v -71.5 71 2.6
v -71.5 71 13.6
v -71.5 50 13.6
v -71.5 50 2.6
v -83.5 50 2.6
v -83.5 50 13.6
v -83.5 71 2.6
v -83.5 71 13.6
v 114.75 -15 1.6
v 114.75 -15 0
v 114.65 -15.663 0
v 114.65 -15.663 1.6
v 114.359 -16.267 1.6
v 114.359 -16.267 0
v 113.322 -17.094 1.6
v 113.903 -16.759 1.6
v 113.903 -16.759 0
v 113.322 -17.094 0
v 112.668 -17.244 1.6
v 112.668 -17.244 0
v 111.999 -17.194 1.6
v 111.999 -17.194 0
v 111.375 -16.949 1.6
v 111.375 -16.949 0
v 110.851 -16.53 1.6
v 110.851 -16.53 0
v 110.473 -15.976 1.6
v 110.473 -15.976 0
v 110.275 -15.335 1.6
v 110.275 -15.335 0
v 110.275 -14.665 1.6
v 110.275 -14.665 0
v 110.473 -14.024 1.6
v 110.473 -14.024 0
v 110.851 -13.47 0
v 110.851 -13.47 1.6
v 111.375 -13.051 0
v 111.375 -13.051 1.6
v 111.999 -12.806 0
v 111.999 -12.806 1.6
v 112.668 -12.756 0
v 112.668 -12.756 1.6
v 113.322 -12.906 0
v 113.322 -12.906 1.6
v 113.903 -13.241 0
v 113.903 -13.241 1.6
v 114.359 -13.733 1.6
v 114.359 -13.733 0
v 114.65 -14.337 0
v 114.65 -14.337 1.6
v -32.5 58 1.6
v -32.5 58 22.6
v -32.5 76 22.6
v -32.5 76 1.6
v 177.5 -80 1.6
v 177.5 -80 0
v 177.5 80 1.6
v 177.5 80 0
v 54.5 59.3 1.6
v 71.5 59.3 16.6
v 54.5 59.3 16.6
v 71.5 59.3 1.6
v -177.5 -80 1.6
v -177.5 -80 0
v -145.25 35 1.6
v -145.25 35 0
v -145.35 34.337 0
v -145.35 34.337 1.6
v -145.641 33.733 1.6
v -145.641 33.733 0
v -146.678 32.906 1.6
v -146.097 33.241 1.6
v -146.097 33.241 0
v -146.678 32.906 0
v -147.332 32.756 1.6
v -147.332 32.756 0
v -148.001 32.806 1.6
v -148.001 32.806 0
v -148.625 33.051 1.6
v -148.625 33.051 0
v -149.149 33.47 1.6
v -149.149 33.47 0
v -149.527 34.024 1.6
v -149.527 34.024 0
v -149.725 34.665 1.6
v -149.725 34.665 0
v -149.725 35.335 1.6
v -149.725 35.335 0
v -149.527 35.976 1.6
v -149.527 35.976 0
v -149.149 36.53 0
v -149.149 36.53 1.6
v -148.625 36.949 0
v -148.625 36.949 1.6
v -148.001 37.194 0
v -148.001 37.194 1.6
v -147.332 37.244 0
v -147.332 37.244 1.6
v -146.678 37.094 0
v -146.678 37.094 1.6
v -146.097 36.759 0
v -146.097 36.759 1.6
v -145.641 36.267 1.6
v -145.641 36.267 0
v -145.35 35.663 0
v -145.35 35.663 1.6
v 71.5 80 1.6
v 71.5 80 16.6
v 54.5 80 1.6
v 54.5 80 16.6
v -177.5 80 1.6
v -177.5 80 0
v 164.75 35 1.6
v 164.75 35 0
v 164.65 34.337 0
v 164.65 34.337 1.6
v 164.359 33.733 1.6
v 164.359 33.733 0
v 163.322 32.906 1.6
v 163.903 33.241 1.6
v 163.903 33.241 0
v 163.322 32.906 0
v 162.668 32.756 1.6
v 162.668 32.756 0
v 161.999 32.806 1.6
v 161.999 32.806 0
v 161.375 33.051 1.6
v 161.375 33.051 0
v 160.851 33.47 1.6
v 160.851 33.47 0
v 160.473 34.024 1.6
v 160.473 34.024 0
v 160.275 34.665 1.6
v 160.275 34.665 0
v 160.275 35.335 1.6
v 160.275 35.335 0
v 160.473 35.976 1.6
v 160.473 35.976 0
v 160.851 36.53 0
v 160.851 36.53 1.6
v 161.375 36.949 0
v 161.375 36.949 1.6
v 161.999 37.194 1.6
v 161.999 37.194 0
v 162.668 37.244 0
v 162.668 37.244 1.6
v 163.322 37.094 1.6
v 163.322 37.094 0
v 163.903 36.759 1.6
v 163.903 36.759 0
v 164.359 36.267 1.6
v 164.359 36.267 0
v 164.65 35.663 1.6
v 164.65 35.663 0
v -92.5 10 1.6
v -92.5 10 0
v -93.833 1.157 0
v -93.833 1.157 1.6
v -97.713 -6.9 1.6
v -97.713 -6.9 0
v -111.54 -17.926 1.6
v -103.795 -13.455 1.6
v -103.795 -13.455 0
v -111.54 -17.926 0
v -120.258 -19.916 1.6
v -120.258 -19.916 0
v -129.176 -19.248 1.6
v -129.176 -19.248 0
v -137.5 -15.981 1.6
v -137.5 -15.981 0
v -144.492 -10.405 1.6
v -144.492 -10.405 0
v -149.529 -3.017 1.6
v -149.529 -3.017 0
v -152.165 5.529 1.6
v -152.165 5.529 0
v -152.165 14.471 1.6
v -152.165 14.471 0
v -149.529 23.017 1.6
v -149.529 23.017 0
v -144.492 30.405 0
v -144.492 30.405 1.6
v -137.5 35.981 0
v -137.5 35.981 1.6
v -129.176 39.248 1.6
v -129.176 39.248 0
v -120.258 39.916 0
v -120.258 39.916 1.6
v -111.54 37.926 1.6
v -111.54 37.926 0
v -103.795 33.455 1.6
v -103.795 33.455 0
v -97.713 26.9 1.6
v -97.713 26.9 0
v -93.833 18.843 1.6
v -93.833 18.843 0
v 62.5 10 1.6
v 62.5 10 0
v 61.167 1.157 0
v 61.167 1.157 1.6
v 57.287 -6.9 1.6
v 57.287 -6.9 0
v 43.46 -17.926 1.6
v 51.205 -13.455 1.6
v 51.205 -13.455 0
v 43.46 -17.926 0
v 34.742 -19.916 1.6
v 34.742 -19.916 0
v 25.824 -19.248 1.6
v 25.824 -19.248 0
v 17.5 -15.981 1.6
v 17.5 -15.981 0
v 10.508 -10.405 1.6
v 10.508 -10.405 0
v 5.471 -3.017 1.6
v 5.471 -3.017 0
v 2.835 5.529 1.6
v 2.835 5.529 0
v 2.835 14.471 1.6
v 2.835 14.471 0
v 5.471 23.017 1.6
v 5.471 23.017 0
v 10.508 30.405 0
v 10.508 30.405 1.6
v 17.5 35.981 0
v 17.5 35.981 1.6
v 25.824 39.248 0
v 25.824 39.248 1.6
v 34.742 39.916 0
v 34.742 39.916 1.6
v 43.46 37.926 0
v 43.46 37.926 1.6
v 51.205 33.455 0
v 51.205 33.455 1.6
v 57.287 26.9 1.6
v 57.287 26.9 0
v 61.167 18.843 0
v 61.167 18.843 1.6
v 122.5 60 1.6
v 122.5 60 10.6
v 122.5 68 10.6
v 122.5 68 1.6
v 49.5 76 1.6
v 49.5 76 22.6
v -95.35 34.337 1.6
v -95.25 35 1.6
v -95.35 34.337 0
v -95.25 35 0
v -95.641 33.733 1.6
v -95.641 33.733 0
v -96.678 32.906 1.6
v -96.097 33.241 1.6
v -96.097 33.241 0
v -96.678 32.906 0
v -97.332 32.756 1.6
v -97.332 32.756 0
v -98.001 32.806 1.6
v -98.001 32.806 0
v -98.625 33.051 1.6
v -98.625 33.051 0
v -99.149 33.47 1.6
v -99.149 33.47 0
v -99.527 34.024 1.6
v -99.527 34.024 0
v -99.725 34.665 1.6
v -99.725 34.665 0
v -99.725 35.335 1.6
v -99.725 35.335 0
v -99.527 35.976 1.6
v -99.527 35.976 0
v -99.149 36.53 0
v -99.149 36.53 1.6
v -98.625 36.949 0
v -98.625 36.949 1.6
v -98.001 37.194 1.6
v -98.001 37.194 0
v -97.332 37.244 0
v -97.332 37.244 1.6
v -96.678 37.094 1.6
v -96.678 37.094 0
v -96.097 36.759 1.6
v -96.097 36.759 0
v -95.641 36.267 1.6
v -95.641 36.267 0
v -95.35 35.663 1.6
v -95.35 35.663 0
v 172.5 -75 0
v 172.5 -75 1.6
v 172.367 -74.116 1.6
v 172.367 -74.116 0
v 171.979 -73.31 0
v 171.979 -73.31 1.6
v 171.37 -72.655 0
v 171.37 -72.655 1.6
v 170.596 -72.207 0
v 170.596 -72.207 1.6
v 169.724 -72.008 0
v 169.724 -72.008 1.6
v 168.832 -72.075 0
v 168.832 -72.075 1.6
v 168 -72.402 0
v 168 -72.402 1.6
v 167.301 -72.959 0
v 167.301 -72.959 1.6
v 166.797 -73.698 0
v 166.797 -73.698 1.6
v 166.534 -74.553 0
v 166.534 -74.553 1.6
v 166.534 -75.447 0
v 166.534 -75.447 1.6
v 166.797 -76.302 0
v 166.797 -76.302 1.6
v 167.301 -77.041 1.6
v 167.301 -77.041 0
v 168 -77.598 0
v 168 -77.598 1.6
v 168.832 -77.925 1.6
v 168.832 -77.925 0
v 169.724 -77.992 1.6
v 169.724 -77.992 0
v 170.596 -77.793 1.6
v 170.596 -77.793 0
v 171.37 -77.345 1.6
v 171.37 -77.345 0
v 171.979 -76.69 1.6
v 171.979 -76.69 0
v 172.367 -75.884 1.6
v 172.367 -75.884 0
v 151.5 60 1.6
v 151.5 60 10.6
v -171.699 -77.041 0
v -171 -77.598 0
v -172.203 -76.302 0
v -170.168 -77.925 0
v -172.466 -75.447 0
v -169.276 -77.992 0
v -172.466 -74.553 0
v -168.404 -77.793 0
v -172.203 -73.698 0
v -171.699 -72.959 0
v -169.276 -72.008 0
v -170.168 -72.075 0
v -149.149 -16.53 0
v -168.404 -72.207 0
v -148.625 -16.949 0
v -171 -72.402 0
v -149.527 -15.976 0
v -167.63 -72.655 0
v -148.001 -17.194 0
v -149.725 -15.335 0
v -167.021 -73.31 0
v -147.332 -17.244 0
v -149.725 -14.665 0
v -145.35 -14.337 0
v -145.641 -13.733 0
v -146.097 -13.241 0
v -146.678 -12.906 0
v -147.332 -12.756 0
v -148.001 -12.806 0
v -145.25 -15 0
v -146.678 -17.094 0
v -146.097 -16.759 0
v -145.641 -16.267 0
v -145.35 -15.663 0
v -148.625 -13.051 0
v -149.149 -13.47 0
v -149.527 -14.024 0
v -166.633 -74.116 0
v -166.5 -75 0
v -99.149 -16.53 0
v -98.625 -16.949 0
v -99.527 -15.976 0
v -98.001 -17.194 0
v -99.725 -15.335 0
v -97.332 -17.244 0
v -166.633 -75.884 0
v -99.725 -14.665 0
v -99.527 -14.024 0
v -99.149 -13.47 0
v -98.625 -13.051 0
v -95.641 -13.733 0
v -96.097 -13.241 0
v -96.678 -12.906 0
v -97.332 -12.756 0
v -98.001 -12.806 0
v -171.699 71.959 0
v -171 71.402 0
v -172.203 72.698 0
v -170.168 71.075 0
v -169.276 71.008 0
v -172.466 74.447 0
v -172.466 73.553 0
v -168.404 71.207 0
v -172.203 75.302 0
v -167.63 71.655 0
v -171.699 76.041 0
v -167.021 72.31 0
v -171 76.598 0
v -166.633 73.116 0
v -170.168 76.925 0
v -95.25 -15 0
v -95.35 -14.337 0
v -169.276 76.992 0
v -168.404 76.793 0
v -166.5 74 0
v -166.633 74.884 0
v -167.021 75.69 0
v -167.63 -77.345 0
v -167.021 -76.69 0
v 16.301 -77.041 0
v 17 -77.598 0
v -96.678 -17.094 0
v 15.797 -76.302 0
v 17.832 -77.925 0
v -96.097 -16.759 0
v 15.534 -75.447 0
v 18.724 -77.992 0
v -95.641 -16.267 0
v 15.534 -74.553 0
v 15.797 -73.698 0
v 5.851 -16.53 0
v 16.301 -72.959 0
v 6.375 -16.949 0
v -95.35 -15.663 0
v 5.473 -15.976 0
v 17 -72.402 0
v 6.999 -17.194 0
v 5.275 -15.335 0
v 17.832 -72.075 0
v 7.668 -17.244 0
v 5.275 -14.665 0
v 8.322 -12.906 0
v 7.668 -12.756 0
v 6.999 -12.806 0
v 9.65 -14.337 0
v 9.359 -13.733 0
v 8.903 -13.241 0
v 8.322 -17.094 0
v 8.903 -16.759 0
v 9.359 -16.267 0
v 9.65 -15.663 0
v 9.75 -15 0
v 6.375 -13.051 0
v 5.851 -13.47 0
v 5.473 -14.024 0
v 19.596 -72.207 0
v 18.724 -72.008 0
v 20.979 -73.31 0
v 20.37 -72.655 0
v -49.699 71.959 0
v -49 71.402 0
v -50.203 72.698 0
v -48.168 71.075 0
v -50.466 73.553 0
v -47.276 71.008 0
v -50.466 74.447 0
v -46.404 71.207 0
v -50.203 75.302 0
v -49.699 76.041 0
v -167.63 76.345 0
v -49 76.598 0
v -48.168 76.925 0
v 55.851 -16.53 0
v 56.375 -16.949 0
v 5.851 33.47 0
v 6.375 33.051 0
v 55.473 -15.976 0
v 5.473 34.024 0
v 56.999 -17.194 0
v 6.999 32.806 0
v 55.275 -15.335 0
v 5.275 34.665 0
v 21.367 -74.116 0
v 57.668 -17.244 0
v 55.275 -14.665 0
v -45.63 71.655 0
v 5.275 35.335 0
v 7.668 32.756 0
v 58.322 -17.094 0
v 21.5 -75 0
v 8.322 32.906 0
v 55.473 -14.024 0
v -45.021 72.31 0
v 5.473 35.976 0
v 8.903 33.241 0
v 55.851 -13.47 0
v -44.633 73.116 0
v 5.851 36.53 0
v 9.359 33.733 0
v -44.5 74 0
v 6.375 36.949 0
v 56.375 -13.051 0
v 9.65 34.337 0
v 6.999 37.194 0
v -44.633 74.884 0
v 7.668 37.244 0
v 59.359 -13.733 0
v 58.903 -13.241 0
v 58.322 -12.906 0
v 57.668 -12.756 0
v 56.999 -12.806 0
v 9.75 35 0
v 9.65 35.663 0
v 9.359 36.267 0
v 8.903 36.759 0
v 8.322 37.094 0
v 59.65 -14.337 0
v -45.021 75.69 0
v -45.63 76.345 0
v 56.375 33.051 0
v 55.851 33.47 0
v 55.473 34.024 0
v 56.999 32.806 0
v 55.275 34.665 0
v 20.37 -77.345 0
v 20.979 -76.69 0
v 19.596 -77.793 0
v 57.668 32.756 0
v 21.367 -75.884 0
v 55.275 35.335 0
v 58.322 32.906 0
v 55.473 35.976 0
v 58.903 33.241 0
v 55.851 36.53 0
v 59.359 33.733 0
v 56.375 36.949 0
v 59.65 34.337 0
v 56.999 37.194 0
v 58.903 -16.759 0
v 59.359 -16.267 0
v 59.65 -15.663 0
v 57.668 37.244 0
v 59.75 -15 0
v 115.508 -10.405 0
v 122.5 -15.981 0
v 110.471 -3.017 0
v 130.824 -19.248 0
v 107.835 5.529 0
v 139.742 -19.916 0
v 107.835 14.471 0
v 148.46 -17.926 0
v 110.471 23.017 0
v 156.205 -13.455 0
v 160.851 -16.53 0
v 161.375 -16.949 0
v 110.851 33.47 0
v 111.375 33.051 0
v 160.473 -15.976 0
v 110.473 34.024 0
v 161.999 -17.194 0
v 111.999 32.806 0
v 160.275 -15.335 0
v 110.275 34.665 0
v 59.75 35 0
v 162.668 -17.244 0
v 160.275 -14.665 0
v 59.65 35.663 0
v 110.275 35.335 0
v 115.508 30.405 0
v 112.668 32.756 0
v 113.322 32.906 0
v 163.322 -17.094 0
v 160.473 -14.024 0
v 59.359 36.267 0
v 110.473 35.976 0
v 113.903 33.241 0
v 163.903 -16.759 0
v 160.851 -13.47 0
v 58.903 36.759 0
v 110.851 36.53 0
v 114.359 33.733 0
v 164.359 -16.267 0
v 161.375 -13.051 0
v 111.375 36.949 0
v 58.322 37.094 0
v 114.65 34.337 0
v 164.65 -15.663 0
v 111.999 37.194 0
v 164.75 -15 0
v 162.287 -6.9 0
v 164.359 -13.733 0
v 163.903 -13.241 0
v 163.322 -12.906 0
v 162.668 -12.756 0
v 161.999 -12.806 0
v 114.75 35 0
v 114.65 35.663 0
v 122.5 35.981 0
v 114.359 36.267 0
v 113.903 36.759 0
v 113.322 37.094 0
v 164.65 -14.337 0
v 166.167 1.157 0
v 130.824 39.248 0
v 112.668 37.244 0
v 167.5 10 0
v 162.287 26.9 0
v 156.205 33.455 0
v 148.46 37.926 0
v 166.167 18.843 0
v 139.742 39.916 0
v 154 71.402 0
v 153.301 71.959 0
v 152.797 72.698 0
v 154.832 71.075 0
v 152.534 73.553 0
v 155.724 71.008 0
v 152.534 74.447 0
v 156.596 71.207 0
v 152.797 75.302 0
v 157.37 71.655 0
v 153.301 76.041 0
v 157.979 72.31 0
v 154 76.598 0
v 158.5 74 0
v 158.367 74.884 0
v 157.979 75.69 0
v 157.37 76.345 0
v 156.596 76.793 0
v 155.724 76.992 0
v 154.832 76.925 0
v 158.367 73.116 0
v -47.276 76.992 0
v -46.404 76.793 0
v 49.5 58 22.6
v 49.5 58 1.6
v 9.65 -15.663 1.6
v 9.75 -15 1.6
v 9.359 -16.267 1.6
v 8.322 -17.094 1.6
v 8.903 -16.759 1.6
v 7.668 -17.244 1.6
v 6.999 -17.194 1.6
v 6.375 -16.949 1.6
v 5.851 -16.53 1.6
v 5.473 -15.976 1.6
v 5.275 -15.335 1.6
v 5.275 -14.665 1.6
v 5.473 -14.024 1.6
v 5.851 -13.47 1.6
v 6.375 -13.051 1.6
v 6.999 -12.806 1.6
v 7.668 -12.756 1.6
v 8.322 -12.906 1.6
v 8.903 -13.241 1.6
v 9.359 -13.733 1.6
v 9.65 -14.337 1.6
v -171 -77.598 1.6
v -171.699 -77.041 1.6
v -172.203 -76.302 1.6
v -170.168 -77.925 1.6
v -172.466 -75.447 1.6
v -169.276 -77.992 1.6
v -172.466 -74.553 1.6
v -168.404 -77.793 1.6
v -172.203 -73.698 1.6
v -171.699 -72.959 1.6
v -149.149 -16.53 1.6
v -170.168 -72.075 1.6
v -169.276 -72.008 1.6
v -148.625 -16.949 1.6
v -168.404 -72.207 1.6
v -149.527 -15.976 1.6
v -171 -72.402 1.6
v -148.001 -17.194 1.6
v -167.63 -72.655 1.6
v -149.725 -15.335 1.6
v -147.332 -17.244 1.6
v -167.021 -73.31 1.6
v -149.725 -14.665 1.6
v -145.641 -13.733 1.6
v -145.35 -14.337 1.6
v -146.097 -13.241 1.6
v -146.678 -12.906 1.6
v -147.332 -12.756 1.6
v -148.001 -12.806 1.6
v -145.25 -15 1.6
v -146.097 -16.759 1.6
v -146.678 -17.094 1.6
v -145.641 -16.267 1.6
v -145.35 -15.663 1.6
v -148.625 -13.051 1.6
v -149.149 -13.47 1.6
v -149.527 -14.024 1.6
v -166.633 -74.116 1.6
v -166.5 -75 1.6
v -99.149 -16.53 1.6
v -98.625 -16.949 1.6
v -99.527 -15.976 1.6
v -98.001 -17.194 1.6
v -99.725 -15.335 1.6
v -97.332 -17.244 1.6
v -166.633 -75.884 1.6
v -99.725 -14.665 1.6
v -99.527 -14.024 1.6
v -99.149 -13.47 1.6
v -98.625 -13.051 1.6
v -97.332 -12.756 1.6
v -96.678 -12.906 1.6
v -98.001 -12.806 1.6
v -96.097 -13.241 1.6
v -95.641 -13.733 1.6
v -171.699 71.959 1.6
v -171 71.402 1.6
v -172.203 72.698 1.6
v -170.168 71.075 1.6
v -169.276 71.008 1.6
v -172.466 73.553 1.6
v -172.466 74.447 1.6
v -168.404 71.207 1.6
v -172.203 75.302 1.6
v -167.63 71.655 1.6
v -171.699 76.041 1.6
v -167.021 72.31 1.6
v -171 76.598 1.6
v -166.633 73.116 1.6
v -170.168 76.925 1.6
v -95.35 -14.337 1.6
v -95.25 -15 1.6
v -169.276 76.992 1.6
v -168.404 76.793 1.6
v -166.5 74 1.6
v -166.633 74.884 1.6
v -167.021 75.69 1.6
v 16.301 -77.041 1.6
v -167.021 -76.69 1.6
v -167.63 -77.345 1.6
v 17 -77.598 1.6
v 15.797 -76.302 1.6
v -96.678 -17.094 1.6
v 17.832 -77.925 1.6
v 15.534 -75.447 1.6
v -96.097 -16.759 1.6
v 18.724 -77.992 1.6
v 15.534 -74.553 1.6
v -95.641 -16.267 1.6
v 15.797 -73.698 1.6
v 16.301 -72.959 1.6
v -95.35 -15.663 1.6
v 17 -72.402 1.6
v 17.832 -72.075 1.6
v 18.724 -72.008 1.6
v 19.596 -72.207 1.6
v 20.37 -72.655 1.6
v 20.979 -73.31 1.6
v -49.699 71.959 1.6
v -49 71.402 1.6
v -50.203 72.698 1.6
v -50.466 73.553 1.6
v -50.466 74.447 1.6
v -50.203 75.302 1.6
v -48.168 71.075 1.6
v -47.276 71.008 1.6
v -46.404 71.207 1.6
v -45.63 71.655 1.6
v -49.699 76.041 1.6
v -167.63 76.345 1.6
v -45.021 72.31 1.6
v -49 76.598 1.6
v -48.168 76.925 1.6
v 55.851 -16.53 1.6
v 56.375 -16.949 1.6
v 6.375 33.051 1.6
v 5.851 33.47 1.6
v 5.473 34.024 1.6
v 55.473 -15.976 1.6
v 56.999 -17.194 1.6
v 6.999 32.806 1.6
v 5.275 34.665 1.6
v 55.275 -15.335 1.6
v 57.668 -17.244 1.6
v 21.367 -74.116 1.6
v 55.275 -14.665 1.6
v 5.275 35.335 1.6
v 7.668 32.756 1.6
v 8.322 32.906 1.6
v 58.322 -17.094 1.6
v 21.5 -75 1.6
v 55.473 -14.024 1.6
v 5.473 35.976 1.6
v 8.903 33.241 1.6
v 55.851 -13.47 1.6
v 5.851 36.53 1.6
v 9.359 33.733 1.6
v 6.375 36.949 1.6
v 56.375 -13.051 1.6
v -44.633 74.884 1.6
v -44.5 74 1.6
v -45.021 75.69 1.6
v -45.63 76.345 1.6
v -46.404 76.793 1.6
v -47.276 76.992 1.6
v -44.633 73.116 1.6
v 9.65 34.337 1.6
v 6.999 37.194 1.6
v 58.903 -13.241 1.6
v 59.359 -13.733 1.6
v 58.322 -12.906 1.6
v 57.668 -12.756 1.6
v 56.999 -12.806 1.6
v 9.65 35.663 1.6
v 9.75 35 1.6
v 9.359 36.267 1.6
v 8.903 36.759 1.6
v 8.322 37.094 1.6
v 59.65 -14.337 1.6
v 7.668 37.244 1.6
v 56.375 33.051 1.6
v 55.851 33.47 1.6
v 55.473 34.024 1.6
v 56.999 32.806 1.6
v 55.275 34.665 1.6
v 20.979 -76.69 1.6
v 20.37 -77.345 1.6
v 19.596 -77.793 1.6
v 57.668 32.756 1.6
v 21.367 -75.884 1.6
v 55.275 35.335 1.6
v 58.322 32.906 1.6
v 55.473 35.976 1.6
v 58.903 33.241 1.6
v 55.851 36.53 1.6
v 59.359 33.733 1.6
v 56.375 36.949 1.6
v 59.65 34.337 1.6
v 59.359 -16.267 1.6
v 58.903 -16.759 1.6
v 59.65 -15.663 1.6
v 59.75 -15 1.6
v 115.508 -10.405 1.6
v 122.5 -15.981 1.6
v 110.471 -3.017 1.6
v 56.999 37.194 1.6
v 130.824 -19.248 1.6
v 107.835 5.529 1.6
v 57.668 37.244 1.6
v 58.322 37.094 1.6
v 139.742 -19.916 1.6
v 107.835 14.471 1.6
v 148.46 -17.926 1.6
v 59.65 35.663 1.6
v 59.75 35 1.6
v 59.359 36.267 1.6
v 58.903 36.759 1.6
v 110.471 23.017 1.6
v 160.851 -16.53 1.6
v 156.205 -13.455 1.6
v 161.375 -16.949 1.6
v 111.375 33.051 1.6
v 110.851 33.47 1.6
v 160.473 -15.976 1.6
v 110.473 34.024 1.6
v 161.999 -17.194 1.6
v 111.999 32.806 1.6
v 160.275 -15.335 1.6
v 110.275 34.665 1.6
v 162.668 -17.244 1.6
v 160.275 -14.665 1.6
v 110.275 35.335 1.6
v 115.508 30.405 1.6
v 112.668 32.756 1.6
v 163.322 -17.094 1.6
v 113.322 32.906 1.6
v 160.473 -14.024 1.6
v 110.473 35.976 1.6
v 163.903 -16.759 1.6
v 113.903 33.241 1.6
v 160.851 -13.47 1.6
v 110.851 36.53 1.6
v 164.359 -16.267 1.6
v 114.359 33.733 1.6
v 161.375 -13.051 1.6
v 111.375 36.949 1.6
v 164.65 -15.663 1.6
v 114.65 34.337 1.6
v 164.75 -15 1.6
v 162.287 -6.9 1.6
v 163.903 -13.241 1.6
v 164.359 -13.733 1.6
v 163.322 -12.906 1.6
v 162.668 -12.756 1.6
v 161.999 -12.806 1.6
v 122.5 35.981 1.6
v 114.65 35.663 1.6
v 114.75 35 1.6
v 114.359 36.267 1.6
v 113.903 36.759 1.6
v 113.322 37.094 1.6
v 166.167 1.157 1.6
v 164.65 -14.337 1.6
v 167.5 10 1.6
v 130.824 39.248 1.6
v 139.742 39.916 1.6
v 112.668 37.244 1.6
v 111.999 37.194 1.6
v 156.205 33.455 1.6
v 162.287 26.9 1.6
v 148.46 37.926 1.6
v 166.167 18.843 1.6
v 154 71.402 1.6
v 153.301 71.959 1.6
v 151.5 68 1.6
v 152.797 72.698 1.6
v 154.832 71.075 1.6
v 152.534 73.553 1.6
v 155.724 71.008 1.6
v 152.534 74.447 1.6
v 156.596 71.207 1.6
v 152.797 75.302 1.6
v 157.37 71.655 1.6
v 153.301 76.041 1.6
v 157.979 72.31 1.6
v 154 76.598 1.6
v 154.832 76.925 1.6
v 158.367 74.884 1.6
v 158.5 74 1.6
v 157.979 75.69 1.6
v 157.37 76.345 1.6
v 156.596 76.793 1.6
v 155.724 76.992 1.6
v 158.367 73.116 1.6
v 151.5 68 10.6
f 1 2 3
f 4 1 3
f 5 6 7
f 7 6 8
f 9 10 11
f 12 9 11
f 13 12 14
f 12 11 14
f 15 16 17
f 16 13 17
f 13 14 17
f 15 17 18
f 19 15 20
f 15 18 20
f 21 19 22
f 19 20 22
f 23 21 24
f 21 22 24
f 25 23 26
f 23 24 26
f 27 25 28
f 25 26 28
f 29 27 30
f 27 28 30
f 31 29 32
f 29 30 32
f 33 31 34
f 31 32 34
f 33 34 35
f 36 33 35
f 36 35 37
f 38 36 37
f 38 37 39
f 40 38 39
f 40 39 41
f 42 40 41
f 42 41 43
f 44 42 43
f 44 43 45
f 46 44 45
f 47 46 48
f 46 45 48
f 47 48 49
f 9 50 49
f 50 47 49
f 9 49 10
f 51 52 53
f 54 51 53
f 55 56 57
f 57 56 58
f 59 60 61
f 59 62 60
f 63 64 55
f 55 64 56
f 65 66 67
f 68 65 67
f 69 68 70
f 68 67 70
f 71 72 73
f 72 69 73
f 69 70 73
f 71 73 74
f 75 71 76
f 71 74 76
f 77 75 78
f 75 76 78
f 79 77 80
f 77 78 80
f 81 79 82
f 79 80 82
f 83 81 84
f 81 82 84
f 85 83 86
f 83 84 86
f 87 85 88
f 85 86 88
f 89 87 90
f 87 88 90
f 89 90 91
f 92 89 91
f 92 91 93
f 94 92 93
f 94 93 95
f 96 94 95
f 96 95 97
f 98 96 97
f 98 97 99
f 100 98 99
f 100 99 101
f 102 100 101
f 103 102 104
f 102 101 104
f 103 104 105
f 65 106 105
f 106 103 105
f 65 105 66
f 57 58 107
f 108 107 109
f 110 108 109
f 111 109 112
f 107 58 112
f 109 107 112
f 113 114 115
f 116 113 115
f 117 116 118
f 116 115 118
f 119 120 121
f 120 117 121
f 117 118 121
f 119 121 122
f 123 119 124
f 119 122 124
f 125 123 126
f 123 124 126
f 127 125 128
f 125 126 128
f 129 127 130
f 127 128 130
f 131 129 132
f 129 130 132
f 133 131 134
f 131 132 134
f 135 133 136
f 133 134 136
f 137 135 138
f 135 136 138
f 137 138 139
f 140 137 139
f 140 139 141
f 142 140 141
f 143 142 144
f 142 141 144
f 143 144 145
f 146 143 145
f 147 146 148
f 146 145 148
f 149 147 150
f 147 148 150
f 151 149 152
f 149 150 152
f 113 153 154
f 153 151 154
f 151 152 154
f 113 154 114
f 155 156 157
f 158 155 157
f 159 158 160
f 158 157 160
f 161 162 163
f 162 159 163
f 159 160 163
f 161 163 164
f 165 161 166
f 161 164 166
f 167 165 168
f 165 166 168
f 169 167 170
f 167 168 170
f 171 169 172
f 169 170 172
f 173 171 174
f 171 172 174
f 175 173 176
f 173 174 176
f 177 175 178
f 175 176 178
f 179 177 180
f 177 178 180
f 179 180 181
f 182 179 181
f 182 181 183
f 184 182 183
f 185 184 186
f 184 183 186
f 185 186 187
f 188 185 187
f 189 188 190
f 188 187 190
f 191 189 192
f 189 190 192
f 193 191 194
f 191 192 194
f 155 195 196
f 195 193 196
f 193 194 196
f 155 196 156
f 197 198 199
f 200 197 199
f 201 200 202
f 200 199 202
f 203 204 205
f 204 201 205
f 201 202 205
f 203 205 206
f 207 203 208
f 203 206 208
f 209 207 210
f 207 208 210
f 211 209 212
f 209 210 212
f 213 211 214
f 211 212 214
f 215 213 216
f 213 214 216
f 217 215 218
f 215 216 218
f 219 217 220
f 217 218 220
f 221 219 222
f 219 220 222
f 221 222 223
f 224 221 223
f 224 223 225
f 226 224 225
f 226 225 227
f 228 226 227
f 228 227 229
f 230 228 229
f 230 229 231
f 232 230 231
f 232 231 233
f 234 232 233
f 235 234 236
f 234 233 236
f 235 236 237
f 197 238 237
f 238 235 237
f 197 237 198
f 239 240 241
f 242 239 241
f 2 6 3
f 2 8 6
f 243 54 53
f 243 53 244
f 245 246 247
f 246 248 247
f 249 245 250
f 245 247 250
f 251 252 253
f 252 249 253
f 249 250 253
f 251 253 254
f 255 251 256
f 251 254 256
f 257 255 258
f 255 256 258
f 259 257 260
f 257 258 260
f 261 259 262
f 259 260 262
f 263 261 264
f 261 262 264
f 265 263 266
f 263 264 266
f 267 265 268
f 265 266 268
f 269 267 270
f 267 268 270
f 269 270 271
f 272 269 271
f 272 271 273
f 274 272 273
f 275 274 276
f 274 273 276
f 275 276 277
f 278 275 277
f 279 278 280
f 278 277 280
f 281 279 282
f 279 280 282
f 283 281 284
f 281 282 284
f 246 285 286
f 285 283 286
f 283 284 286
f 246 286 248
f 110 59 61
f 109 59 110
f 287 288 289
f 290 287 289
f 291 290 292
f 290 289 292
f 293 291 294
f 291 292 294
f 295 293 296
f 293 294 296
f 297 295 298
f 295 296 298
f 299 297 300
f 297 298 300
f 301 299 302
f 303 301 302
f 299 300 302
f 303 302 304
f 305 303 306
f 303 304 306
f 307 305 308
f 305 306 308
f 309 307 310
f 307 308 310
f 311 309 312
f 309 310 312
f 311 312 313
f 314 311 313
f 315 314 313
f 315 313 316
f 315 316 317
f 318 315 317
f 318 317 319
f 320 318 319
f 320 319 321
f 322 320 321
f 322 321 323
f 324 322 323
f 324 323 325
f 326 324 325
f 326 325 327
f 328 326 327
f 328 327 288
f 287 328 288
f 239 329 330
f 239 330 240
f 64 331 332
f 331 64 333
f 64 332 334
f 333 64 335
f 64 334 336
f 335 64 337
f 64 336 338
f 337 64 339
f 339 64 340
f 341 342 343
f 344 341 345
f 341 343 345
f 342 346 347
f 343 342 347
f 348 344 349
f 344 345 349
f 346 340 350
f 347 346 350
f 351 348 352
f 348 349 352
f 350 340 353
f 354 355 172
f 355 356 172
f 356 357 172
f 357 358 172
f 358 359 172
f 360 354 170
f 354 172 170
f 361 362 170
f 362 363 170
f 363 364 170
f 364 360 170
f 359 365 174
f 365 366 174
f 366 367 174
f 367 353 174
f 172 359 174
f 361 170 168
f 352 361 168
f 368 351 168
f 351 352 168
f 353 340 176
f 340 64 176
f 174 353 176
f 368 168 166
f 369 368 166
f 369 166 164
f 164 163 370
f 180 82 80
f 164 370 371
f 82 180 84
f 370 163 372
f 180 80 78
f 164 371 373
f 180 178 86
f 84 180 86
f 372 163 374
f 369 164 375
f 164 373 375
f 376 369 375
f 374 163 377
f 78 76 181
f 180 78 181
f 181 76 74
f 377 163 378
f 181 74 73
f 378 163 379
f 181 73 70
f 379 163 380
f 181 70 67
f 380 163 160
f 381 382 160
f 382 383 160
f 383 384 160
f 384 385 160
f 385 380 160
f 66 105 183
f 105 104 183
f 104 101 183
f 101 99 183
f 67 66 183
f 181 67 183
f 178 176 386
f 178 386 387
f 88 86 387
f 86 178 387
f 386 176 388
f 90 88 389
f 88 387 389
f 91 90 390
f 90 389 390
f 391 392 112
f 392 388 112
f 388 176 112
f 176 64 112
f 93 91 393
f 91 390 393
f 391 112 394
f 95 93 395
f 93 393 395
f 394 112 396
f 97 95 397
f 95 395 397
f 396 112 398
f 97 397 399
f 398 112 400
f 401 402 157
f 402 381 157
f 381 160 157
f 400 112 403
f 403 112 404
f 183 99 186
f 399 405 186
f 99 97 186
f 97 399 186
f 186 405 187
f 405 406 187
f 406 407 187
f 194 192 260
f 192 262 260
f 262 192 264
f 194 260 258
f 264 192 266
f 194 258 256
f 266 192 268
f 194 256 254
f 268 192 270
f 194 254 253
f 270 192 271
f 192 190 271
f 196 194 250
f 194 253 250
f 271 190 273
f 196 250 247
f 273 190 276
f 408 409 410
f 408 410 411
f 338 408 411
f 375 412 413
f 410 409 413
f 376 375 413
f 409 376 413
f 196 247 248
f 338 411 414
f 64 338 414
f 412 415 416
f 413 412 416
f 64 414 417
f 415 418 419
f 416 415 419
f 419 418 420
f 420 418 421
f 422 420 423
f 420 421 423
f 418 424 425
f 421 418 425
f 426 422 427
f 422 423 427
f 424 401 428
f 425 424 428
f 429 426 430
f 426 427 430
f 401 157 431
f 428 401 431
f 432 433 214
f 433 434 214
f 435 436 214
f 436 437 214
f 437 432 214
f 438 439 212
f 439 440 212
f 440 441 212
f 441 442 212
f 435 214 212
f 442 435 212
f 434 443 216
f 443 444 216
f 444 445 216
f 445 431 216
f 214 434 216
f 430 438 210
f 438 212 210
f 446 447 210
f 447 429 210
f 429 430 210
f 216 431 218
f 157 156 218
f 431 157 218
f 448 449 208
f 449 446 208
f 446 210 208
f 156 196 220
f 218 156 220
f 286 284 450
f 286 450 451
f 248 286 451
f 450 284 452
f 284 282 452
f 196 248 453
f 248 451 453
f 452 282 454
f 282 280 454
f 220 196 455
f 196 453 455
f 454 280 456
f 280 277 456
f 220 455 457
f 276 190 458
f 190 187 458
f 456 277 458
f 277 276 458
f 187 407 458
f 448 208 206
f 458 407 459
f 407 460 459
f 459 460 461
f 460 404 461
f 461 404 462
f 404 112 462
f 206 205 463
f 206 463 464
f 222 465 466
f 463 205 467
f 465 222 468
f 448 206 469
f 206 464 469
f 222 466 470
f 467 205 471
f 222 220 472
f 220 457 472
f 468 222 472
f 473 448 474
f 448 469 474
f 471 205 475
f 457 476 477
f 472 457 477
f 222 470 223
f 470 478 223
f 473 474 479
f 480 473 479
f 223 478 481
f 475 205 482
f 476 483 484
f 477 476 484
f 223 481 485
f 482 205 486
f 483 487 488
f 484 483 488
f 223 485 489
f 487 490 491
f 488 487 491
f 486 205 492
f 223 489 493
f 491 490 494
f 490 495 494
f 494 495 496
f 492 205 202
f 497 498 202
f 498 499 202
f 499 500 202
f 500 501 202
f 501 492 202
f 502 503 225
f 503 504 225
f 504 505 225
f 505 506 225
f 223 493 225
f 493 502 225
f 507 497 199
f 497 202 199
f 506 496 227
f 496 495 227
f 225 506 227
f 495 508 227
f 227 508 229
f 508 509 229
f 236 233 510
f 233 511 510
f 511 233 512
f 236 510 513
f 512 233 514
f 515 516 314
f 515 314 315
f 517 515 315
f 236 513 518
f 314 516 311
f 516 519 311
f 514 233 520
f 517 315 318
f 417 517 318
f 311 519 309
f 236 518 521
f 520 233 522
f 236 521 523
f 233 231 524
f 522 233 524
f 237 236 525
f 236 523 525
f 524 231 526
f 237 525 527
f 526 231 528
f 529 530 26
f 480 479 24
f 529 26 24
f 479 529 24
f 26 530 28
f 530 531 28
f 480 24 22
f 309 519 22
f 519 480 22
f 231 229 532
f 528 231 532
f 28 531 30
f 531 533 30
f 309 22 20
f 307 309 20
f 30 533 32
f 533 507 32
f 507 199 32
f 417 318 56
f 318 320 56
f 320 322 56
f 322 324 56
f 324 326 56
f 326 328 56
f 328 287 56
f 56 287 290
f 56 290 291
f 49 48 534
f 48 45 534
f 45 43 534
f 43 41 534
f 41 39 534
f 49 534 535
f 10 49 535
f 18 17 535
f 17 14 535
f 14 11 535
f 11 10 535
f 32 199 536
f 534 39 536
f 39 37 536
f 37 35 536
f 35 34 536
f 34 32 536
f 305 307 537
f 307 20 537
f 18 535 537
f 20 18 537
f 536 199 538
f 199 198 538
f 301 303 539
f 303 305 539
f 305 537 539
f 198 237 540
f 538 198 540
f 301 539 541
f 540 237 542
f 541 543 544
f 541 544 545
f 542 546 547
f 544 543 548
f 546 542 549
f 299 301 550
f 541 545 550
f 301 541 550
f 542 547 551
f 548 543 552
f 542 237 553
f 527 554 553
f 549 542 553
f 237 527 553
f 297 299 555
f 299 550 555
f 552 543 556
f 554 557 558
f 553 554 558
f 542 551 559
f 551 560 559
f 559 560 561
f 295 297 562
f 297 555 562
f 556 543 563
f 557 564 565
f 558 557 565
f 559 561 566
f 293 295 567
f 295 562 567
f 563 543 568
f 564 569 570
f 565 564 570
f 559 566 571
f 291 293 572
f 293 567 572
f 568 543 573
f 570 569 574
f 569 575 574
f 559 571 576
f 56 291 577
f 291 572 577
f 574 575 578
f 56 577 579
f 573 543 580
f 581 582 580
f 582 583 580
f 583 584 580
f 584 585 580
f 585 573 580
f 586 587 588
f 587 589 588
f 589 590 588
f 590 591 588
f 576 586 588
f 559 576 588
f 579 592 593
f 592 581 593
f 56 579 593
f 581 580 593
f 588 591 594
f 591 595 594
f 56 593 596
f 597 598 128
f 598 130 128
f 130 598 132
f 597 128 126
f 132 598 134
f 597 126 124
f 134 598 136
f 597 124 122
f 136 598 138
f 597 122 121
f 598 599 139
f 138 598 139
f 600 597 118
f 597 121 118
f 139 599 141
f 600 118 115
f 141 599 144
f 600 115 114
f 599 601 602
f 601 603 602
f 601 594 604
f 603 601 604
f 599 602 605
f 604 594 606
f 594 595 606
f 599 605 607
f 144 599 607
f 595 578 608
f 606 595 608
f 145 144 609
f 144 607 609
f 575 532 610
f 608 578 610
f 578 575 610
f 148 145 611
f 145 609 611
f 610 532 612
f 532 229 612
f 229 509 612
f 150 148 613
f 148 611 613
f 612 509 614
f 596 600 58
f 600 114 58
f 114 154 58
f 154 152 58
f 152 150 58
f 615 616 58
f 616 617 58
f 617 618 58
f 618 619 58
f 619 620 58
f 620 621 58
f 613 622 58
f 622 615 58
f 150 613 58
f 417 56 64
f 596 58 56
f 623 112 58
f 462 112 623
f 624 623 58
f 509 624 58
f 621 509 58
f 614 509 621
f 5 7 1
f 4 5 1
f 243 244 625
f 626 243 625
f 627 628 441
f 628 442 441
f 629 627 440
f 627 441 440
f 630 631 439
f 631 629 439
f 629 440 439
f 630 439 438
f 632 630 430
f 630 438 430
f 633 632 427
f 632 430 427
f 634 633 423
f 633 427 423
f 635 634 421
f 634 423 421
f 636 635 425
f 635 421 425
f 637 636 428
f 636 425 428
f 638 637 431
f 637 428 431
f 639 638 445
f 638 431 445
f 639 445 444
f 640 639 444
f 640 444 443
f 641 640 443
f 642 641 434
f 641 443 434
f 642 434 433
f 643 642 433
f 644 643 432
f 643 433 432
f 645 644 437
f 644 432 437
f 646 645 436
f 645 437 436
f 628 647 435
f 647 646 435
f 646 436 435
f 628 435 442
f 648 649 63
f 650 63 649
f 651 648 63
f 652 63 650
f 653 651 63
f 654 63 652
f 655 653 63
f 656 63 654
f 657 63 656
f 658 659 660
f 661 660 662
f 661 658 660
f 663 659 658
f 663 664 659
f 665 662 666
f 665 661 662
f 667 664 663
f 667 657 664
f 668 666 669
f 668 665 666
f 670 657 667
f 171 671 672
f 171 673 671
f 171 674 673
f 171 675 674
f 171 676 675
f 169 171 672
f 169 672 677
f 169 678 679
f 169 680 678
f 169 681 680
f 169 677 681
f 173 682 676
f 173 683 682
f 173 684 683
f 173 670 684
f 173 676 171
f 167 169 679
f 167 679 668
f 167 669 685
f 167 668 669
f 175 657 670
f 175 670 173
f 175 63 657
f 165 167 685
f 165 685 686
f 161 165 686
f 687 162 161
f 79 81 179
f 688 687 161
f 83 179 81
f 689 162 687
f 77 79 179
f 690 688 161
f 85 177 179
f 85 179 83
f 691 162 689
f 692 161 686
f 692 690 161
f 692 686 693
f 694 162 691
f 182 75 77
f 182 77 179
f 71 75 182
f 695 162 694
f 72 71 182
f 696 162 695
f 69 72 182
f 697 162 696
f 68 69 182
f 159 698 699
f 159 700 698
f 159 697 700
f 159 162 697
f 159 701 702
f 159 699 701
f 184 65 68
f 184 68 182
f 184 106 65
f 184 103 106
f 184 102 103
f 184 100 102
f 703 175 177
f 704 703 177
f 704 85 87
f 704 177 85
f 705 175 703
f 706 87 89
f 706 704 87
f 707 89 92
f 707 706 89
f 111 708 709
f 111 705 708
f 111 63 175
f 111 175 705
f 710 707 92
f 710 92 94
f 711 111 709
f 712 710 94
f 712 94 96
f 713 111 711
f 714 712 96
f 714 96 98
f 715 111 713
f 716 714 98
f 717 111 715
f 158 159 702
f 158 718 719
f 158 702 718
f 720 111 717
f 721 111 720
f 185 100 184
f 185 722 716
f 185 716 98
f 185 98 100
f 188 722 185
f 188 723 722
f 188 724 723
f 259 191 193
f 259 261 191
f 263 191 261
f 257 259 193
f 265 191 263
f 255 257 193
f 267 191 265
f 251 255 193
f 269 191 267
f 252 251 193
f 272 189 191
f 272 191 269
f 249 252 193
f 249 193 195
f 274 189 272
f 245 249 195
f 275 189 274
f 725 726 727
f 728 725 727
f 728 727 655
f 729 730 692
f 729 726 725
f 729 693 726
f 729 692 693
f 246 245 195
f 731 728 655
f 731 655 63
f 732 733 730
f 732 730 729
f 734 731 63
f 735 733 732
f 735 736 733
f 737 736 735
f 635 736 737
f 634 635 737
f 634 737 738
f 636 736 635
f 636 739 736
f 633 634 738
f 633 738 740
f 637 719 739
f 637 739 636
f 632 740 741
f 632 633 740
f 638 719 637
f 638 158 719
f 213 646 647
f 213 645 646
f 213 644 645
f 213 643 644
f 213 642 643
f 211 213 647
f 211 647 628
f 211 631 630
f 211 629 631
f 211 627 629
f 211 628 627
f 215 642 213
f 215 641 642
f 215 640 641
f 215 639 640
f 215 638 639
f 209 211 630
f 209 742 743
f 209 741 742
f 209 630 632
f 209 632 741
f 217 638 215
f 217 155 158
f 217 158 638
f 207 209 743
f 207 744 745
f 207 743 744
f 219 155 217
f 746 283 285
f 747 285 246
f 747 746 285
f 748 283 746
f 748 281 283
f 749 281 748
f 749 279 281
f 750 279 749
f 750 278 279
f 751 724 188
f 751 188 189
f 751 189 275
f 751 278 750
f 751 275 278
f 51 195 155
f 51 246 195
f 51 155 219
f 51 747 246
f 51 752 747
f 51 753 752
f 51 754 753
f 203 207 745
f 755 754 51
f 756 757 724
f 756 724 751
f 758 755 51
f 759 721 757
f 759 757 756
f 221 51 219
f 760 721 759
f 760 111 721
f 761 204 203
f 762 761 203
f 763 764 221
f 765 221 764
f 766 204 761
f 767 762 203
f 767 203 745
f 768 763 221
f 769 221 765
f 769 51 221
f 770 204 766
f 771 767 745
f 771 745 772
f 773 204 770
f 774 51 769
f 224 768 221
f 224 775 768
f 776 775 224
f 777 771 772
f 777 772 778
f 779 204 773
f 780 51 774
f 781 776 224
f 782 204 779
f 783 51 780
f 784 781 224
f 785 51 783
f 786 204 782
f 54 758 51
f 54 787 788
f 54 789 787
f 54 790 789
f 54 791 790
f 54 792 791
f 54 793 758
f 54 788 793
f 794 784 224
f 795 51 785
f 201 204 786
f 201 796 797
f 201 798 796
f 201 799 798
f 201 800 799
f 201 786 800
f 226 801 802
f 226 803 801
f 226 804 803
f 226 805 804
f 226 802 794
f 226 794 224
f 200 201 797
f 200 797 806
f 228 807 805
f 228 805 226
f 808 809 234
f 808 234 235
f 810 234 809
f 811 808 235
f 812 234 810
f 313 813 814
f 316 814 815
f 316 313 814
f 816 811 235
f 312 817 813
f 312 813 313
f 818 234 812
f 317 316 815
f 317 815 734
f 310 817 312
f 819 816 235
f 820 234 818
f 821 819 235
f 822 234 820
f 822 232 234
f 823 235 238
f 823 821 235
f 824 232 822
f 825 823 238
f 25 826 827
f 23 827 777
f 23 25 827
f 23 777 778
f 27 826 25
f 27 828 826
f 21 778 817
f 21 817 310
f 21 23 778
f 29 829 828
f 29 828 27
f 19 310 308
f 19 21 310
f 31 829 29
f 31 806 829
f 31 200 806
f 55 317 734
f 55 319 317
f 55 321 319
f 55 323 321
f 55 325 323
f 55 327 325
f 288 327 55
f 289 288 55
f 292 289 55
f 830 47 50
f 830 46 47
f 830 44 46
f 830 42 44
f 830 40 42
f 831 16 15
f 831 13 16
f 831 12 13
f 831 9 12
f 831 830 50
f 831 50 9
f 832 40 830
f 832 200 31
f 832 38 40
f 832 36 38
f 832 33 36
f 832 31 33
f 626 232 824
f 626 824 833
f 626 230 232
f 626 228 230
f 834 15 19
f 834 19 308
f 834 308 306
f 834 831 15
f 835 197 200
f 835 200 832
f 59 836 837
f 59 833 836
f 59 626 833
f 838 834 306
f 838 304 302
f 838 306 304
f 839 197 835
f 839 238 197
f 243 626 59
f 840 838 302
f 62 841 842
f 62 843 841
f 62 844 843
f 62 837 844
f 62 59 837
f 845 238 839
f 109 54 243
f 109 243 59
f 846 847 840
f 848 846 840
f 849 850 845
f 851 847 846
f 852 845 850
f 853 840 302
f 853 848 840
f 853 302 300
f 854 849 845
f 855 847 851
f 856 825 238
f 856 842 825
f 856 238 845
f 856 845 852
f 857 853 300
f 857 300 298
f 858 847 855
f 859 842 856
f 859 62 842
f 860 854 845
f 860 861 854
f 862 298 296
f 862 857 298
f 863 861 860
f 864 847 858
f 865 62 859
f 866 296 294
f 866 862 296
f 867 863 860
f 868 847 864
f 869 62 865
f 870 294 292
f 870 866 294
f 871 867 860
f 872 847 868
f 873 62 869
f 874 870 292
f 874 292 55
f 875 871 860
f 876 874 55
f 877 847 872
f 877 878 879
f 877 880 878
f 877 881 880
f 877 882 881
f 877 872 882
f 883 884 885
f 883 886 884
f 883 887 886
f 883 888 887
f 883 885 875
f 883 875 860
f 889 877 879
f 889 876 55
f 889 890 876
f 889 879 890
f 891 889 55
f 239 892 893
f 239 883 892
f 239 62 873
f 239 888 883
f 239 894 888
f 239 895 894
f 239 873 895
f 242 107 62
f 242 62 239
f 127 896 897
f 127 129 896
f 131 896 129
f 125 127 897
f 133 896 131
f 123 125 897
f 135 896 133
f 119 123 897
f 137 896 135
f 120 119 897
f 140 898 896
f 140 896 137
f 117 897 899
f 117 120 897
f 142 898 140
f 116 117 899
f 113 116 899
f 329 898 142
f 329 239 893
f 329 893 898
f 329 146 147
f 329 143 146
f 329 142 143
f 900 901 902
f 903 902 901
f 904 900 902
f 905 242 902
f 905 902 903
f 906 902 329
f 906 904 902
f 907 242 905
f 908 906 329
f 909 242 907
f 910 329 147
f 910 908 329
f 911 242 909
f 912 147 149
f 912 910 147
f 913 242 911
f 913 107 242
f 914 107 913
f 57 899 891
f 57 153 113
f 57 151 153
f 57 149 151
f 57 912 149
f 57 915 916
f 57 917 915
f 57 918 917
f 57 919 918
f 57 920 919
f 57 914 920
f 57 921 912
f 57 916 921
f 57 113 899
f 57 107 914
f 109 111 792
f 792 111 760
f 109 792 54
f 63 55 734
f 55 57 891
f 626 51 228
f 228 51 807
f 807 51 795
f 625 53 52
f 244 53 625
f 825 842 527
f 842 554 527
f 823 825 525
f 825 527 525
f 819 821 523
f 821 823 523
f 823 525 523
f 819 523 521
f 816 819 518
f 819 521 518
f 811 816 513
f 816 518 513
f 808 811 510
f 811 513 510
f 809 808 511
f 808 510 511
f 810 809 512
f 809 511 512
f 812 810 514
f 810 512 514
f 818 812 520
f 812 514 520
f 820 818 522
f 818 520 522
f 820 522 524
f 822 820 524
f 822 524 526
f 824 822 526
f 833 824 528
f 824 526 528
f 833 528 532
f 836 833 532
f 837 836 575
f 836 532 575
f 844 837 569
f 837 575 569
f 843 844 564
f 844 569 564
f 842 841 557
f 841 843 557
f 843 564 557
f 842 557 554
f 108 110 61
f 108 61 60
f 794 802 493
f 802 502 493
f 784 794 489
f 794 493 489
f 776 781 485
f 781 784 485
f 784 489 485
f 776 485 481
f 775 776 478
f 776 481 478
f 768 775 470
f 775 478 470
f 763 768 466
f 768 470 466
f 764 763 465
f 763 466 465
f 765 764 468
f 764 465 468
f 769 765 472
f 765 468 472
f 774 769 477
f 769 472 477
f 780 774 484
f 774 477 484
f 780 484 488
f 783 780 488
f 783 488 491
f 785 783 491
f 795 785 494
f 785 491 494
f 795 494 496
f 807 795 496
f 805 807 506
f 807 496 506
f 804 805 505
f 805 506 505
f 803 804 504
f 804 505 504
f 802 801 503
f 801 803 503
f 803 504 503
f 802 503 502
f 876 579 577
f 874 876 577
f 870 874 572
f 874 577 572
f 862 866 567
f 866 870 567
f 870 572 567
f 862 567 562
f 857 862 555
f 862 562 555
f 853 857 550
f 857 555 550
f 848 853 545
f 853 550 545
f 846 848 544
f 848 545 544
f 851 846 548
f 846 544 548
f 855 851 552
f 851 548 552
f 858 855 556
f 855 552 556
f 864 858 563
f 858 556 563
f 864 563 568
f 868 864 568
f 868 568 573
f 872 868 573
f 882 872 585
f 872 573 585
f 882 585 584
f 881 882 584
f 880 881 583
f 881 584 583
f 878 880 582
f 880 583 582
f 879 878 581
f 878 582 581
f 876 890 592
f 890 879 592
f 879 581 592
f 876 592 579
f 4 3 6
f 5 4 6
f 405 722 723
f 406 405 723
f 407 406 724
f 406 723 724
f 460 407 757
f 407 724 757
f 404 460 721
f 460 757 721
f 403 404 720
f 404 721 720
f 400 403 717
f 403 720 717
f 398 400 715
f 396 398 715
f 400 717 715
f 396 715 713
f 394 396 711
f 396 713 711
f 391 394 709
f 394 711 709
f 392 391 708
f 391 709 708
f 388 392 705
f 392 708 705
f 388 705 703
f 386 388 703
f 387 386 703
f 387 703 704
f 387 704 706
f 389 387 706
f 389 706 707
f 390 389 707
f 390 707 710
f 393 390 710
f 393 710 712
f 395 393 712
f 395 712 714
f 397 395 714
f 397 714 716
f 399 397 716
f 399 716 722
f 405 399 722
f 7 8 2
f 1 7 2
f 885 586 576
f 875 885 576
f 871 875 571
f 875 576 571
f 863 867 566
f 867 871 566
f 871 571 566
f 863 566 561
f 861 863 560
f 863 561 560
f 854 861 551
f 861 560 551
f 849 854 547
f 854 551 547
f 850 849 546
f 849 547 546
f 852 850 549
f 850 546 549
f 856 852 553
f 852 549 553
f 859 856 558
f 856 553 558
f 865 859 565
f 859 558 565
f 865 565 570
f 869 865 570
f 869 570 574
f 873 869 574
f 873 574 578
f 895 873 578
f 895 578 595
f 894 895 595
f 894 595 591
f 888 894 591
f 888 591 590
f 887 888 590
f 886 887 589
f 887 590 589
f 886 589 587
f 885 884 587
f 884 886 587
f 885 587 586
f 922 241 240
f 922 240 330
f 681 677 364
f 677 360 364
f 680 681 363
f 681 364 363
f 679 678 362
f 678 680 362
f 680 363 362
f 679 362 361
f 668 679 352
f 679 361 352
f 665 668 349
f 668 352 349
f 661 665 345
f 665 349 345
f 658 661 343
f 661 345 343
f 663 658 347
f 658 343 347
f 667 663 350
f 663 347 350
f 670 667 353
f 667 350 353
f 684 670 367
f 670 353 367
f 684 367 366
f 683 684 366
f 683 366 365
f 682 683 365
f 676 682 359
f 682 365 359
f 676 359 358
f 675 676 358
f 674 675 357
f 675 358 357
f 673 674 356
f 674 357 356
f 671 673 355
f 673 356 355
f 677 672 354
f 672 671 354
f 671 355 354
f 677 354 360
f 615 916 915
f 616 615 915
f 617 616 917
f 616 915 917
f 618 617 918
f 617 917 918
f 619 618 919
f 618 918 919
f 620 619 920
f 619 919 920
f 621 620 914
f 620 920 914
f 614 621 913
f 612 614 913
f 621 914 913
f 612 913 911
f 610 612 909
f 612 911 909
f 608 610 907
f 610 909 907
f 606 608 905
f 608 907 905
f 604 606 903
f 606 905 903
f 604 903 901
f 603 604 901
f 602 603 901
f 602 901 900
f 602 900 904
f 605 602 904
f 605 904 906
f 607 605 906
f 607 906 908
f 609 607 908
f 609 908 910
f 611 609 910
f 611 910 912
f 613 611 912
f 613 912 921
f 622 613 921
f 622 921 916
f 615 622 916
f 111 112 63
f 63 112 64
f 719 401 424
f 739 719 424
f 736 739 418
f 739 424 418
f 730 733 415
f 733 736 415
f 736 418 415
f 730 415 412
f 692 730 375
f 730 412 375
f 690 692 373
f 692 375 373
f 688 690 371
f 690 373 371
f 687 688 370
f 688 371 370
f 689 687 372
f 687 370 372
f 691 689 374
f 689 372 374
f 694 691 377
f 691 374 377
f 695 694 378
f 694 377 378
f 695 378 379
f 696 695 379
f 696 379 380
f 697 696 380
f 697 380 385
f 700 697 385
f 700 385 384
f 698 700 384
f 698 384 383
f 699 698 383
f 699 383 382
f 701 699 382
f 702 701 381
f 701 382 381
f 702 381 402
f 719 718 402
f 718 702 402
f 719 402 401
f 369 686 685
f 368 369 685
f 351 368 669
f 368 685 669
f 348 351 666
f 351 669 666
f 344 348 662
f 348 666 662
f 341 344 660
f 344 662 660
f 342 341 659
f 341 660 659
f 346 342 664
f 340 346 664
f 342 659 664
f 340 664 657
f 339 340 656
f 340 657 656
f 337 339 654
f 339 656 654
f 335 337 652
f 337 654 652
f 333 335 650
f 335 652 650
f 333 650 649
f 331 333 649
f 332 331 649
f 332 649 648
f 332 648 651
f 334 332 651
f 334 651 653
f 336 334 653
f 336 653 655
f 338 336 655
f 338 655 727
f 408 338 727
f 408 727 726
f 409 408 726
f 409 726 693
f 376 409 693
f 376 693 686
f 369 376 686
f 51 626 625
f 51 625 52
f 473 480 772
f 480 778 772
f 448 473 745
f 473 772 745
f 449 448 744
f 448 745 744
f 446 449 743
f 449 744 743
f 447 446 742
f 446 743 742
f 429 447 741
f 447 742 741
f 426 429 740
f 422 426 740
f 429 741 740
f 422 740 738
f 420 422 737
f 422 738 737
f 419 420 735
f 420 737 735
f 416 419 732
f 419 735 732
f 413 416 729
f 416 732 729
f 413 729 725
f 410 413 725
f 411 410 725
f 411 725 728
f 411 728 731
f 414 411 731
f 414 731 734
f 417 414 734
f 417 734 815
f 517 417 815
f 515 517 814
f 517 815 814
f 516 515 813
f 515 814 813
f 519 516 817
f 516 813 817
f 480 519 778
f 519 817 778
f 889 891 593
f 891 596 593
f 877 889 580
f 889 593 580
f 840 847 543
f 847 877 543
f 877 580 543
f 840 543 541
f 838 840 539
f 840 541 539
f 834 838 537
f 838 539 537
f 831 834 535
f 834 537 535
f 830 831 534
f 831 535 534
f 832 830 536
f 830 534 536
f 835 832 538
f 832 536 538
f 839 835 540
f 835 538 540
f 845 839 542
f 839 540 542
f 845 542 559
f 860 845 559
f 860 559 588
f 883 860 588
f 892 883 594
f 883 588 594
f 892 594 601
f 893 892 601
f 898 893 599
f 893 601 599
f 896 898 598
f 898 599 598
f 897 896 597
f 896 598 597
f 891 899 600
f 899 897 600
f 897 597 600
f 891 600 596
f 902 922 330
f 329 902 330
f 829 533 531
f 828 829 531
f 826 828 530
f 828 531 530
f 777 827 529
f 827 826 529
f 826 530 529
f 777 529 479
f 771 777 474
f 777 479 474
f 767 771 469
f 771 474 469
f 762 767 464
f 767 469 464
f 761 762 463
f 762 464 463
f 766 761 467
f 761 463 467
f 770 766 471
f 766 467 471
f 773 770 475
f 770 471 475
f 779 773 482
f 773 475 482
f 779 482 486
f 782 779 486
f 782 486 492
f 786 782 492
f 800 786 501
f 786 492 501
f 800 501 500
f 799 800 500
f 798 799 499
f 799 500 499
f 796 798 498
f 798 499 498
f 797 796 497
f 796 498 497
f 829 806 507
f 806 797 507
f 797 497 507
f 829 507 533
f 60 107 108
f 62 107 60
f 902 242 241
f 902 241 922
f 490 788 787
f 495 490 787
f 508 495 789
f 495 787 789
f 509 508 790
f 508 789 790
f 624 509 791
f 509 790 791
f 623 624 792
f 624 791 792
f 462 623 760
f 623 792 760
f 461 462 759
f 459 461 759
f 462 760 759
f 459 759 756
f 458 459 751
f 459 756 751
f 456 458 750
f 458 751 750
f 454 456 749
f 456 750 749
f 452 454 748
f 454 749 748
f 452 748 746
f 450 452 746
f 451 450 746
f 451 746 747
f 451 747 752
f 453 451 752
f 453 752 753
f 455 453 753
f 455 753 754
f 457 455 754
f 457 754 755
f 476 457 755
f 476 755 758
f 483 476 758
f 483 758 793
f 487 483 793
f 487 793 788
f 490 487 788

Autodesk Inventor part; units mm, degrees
ref_plane "YZ Plane" through (0, 0, 0) normal (1, 0, 0) x (0, 1, 0)
sketch "Sketch1" plane through (0, 0, 0) normal (0, 0, 1) x (1, 0, 0)
  line L0 (-177.5, -80) -> (177.5, -80)
  line L1 (177.5, -80) -> (177.5, 80)
  line L2 (177.5, 80) -> (-177.5, 80)
  line L3 (-177.5, 80) -> (-177.5, -80)
  line L4 (-177.5, -80) -> (177.5, 80) construction
  line L5 (177.5, -80) -> (-177.5, 80) construction
  circle A0 centre (-122.5, 10) radius 30
  circle A1 centre (32.5, 10) radius 30
  circle A2 centre (137.5, 10) radius 30
  line L6 (-152.5, 80) -> (-152.5, -80) construction
  line L7 (2.5, 80) -> (2.5, -80) construction
  line L8 (107.5, -80) -> (107.5, 80) construction
  line L9 (-177.5, -20) -> (177.5, -20) construction
  line L10 (-147.5, -15) -> (-97.5, -15) construction
  line L11 (-97.5, -15) -> (-97.5, 35) construction
  line L12 (-97.5, 35) -> (-147.5, 35) construction
  line L13 (-147.5, 35) -> (-147.5, -15) construction
  line L14 (-147.5, -15) -> (-97.5, 35) construction
  line L15 (-97.5, -15) -> (-147.5, 35) construction
  line L16 (7.5, -15) -> (57.5, -15) construction
  line L17 (57.5, -15) -> (57.5, 35) construction
  line L18 (57.5, 35) -> (7.5, 35) construction
  line L19 (7.5, 35) -> (7.5, -15) construction
  line L20 (7.5, -15) -> (57.5, 35) construction
  line L21 (57.5, -15) -> (7.5, 35) construction
  line L22 (112.5, -15) -> (162.5, -15) construction
  line L23 (162.5, -15) -> (162.5, 35) construction
  line L24 (162.5, 35) -> (112.5, 35) construction
  line L25 (112.5, 35) -> (112.5, -15) construction
  line L26 (112.5, -15) -> (162.5, 35) construction
  line L27 (162.5, -15) -> (112.5, 35) construction
  circle A3 centre (-147.5, 35) radius 2.25
  circle A4 centre (-97.5, 35) radius 2.25
  circle A5 centre (-97.5, -15) radius 2.25
  circle A6 centre (-147.5, -15) radius 2.25
  circle A7 centre (7.5, 35) radius 2.25
  circle A8 centre (57.5, 35) radius 2.25
  circle A9 centre (57.5, -15) radius 2.25
  circle A10 centre (7.5, -15) radius 2.25
  circle A11 centre (112.5, 35) radius 2.25
  circle A12 centre (162.5, 35) radius 2.25
  circle A13 centre (162.5, -15) radius 2.25
  circle A14 centre (112.5, -15) radius 2.25
  point P0 (0, 0)
  dimension "d0" = 160
  dimension "d1" = 355
  dimension "d4" = 25
  dimension "d6" = 180
  dimension "d8" = 285
  dimension "d9" = 100
  dimension "d10" = 60
  dimension "d11" = 50
  dimension "d12" = 4.5
extrude "PCB" add sketch "Sketch1" along normal blind 1.6
ref_plane "Work Plane1" through (0, 0, 2.6) normal (0, 0, 1) x (1, 0, 0)
ref_plane "Work Plane2" through (0, 0, 13.6) normal (0, 0, 1) x (1, 0, 0)
sketch "Sketch2" plane through (0, 0, 1.6) normal (0, 0, 1) x (1, 0, 0)
  line L0 (-177.5, 80) -> (-177.5, -80) construction
  line L1 (177.5, 80) -> (-177.5, 80) construction
  line L2 (-83.5, 71) -> (-71.5, 71)
  line L3 (-71.5, 71) -> (-71.5, 50)
  line L4 (-71.5, 50) -> (-83.5, 50)
  line L5 (-83.5, 50) -> (-83.5, 71)
  point P0 (0, 0)
  dimension "d15" = 94
  dimension "d16" = 106
  dimension "d17" = 9
  dimension "d18" = 30
extrude "USB" add sketch "Sketch2" against normal up to surface (11 mm away) from surface at 12
sketch "Sketch3" plane through (0, 0, 1.6) normal (0, 0, 1) x (1, 0, 0)
  line L0 (-32.5, 76) -> (49.5, 76)
  line L1 (49.5, 76) -> (49.5, 58)
  line L2 (49.5, 58) -> (-32.5, 58)
  line L3 (-32.5, 58) -> (-32.5, 76)
  line L4 (-177.5, 80) -> (-177.5, -80) construction
  line L5 (177.5, 80) -> (-177.5, 80) construction
  point P0 (0, 0)
  dimension "d21" = 145
  dimension "d22" = 227
  dimension "d23" = 4
  dimension "d24" = 22
extrude "Extrusion3" add sketch "Sketch3" along normal blind 21
sketch "Sketch4" plane through (0, 0, 1.6) normal (0, 0, 1) x (1, 0, 0)
  line L0 (122.5, 68) -> (151.5, 68)
  line L1 (151.5, 68) -> (151.5, 60)
  line L2 (151.5, 60) -> (122.5, 60)
  line L3 (122.5, 60) -> (122.5, 68)
  line L4 (177.5, -80) -> (177.5, 80) construction
  line L5 (177.5, 80) -> (-177.5, 80) construction
  point P0 (0, 0)
  dimension "d27" = 26
  dimension "d28" = 55
  dimension "d29" = 12
  dimension "d30" = 20
extrude "Extrusion4" add sketch "Sketch4" along normal blind 9
sketch "Sketch5" plane through (0, 0, 1.6) normal (0, 0, 1) x (1, 0, 0)
  line L0 (177.5, 80) -> (-177.5, 80) projected
  line L1 (71.5, 80) -> (71.5, 59.3001)
  line L2 (71.5, 59.3001) -> (54.5, 59.3001)
  line L3 (54.5, 59.3001) -> (54.5, 80)
  point P0 (0, 0)
  dimension "d33" = 249
  dimension "d34" = 232
extrude "Extrusion5" add sketch "Sketch5" along normal blind 15
sketch "Sketch6" plane through (0, 0, 1.6) normal (0, 0, 1) x (1, 0, 0)
  line L0 (54.5, 80) -> (-177.5, 80) projected
  line L1 (-177.5, 80) -> (-177.5, -80) projected
  line L2 (-177.5, -80) -> (177.5, -80) projected
  line L3 (177.5, -80) -> (177.5, 80) projected
  line L4 (177.5, 80) -> (71.5, 80) projected
  circle A0 centre (169.5, -75) radius 3
  circle A1 centre (18.5, -75) radius 3
  circle A2 centre (155.5, 74) radius 3
  circle A3 centre (-47.5, 74) radius 3
  circle A4 centre (-169.5, -75) radius 3
  circle A5 centre (-169.5, 74) radius 3
  line L5 (-169.5, 74) -> (-47.5, 74) construction
  line L6 (-47.5, 74) -> (155.5, 74) construction
  line L7 (169.5, -75) -> (18.5, -75) construction
  line L8 (18.5, -75) -> (-169.5, -75) construction
  point P0 (0, 0)
  dimension "d37" = 6
  dimension "d38" = 8
  dimension "d39" = 196
  dimension "d40" = 347
  dimension "d41" = 8
  dimension "d42" = 130
  dimension "d43" = 333
  dimension "d44" = 6
  dimension "d45" = 5
extrude "Extrusion6" cut sketch "Sketch6" against normal up to surface (1.6 mm away)
properties part number "PCB" material "Gold"
